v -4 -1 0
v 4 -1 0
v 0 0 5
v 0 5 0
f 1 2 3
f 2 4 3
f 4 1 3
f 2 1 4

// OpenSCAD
p = [
 [0,5,0],    // 0
 [4,-1,0],   // 1
 [-4,-1,0],  // 2
 [0,0,5]     // 3
];

f=[
 [3,1,2],
 [3,0,1],
 [3,2,0],
 [0,2,1]
];

polyhedron( p, f );
